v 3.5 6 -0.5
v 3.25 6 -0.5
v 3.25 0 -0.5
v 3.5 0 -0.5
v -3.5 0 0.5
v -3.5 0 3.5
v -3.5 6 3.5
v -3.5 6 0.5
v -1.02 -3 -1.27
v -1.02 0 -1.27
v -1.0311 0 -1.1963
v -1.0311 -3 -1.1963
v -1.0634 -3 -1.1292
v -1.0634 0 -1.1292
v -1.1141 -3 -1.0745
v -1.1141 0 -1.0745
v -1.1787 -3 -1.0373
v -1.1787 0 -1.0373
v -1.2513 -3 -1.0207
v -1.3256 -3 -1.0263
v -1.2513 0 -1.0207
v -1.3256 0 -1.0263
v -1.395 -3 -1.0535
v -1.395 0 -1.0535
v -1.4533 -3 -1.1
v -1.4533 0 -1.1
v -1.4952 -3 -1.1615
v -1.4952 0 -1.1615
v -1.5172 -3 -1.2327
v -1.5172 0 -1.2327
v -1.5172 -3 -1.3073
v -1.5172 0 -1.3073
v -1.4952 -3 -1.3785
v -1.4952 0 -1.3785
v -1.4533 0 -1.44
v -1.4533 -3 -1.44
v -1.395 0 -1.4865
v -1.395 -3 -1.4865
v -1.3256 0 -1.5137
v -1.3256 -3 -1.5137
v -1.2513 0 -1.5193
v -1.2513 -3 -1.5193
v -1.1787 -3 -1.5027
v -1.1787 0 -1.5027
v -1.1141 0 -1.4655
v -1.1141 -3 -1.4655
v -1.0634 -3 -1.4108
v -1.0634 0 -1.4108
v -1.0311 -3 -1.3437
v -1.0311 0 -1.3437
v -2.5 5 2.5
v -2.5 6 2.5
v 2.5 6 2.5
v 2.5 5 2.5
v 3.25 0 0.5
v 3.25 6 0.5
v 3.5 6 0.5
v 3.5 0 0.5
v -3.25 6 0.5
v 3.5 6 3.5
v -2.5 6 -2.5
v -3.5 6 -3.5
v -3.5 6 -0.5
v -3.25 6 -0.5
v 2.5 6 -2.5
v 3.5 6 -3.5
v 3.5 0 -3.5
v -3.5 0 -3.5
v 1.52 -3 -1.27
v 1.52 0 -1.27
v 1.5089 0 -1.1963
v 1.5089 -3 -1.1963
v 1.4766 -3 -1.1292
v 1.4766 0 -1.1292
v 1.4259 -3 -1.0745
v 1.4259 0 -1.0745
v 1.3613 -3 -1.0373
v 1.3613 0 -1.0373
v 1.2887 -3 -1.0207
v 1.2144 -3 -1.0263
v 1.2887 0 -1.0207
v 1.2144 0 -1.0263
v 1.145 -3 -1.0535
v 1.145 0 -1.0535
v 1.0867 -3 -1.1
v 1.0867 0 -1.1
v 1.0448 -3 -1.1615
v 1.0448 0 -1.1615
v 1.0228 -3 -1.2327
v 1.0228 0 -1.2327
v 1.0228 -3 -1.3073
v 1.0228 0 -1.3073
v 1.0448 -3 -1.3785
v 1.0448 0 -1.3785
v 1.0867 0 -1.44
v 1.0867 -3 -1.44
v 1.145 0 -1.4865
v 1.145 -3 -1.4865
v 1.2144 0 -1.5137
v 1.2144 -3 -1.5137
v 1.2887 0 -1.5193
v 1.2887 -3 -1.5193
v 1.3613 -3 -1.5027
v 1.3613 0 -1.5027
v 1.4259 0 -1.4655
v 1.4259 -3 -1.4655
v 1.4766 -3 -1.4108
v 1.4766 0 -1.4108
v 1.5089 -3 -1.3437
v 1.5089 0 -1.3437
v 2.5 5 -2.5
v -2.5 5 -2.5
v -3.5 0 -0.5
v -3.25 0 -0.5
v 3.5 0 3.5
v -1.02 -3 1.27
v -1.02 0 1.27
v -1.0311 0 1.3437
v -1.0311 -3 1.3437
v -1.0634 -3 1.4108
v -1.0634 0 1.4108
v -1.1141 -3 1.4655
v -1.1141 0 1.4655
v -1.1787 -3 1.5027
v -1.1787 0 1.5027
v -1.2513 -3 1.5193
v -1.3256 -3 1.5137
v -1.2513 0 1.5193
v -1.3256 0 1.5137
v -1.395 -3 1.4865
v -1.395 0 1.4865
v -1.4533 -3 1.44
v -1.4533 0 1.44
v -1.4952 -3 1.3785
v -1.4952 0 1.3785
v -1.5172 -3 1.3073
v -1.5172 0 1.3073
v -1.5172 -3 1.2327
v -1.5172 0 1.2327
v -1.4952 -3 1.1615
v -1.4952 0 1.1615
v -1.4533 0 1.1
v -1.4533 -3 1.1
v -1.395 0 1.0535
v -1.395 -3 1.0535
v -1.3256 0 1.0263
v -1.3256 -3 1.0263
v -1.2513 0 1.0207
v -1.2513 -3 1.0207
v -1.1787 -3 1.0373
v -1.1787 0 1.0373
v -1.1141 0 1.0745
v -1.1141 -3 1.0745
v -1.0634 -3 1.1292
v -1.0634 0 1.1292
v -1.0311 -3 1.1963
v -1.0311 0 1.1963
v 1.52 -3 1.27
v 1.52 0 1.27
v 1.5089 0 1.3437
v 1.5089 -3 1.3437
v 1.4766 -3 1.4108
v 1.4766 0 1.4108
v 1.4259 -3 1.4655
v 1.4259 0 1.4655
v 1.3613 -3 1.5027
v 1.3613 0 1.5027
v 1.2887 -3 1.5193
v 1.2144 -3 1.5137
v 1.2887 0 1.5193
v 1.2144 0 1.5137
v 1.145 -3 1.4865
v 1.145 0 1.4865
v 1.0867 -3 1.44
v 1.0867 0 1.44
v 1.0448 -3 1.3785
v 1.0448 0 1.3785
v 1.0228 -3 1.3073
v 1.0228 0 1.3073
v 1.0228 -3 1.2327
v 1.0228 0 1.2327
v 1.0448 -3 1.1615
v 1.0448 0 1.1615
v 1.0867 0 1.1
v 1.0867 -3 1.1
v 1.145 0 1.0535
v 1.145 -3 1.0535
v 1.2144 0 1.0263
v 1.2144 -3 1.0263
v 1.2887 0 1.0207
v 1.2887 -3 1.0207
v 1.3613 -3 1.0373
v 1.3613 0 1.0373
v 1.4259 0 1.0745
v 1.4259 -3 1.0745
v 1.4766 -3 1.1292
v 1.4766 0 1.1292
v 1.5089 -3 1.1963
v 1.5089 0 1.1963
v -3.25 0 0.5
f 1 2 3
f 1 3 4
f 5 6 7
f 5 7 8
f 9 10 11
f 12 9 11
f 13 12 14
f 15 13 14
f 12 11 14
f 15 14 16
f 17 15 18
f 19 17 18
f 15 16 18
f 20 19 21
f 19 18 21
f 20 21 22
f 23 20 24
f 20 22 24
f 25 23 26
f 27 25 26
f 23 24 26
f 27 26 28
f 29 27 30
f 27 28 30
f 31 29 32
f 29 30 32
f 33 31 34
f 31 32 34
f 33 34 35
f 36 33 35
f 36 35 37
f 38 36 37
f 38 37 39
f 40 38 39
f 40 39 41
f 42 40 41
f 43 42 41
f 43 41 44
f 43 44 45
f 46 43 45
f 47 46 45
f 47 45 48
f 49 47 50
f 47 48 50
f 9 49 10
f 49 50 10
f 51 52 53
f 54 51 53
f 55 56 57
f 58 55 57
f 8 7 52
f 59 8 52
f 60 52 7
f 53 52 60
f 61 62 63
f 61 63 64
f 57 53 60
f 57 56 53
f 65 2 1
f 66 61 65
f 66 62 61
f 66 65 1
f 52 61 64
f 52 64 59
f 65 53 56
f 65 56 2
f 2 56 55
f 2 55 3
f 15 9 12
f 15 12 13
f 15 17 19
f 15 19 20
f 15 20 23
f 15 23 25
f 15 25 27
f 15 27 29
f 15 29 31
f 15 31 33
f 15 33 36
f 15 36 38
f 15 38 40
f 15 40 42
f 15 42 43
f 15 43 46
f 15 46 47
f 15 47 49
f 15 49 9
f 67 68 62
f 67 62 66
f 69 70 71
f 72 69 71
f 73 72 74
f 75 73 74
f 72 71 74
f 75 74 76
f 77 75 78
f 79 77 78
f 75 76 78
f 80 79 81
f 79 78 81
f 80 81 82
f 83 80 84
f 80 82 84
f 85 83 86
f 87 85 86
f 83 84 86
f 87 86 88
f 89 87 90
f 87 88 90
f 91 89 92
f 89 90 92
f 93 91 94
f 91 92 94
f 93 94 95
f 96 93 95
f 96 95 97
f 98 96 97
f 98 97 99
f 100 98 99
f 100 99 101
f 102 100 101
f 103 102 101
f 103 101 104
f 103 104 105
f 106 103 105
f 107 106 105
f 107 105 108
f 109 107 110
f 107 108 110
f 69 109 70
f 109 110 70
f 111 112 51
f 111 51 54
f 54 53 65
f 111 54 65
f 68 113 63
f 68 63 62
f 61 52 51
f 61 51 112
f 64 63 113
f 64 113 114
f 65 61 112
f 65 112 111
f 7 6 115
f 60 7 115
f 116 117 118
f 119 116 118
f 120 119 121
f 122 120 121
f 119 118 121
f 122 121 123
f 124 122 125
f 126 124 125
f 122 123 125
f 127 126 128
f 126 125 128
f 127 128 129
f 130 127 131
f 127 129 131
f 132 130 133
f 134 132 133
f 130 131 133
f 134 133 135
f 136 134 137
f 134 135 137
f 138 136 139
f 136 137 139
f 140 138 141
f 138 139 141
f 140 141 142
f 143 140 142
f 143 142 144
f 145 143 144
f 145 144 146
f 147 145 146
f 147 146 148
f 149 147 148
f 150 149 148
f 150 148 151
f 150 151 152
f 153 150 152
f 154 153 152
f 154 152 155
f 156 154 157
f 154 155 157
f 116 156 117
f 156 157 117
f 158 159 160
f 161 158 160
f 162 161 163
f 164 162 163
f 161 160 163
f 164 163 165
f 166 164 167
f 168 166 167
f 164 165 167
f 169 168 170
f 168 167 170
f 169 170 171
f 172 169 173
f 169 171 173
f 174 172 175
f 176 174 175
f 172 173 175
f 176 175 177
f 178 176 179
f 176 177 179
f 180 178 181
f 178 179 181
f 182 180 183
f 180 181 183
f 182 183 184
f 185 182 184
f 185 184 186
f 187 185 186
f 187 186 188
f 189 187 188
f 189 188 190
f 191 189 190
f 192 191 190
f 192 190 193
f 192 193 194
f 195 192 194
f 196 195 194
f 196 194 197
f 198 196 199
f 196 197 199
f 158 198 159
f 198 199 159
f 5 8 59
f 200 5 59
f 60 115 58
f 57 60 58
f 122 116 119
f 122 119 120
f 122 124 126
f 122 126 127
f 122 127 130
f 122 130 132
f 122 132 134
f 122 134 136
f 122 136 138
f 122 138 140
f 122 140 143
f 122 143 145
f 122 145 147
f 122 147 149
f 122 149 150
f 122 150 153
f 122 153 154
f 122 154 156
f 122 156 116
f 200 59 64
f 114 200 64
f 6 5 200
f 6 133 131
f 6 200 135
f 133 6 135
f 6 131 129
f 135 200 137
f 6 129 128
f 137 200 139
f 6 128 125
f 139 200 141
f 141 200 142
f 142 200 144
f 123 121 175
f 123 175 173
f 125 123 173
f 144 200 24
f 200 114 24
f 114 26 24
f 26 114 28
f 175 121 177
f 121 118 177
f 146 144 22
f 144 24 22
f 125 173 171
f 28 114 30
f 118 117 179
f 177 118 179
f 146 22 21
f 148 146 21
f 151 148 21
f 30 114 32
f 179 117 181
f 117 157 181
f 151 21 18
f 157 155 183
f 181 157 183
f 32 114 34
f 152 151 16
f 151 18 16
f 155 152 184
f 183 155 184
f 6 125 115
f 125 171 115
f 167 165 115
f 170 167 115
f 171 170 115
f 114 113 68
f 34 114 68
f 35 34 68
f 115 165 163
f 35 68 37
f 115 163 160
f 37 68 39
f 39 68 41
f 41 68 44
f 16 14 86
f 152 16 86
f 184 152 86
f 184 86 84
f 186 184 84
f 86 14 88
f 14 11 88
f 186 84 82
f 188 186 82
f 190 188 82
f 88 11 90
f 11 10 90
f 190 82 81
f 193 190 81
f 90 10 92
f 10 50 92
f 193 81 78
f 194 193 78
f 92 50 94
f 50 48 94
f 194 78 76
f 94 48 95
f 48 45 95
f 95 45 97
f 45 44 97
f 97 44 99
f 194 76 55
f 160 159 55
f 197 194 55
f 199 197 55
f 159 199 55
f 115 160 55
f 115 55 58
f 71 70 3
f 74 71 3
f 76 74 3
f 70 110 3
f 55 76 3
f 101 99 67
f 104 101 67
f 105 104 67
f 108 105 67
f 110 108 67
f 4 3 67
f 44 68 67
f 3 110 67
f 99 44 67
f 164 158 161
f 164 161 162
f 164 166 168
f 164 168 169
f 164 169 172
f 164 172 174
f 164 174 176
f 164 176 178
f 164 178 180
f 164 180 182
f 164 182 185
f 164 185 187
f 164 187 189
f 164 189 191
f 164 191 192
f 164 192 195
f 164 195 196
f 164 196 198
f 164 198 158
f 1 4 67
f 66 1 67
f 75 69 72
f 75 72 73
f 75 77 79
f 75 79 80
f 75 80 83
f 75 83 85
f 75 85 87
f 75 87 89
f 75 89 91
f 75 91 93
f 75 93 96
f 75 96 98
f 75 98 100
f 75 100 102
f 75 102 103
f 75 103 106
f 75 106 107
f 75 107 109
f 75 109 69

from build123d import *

# Parameters (mm, degrees)
CROQUIS1_W              = 7
CROQUIS1_H              = 7
SALIENTE_EXTRUIR1_DEPTH = 6
CROQUIS2_R              = 0.25
SALIENTE_EXTRUIR2_DEPTH = 3
CROQUIS3_W              = 5
CROQUIS3_H              = 5
CORTAR_EXTRUIR1_DEPTH   = 1
CROQUIS4_W              = 0.5
CROQUIS4_H              = 1
CORTAR_EXTRUIR2_DEPTH   = 10


with BuildPart() as part:
    # Croquis1 → Saliente-Extruir1 (new body)
    with BuildSketch(Plane(origin=(0, 0, 0), x_dir=(1, 0, 0), z_dir=(0, 1, 0))):
        Rectangle(CROQUIS1_W, CROQUIS1_H)
    extrude(amount=SALIENTE_EXTRUIR1_DEPTH)

    # Croquis2 → Saliente-Extruir2 (add)
    with BuildSketch(Plane.XZ):
        with Locations((-1.27, 1.27)):
            Circle(CROQUIS2_R)
        with Locations((1.27, 1.27)):
            Circle(CROQUIS2_R)
        with Locations((1.27, -1.27)):
            Circle(CROQUIS2_R)
        with Locations((-1.27, -1.27)):
            Circle(CROQUIS2_R)
    extrude(amount=SALIENTE_EXTRUIR2_DEPTH)

    # Croquis3 → Cortar-Extruir1 (cut)
    with BuildSketch(Plane(origin=(0, 6, 0), x_dir=(1, 0, 0), z_dir=(0, 1, 0))):
        Rectangle(CROQUIS3_W, CROQUIS3_H)
    extrude(amount=-CORTAR_EXTRUIR1_DEPTH, mode=Mode.SUBTRACT)

    # Croquis4 → Cortar-Extruir2 (cut, through all)
    with BuildSketch(Plane(origin=(0, 6, 0), x_dir=(1, 0, 0), z_dir=(0, 1, 0))):
        with Locations((3.5, 0)):
            Rectangle(CROQUIS4_W, CROQUIS4_H)
        with Locations((-3.5, 0)):
            Rectangle(CROQUIS4_W, CROQUIS4_H)
    extrude(amount=-CORTAR_EXTRUIR2_DEPTH, mode=Mode.SUBTRACT)


solid = part.part
